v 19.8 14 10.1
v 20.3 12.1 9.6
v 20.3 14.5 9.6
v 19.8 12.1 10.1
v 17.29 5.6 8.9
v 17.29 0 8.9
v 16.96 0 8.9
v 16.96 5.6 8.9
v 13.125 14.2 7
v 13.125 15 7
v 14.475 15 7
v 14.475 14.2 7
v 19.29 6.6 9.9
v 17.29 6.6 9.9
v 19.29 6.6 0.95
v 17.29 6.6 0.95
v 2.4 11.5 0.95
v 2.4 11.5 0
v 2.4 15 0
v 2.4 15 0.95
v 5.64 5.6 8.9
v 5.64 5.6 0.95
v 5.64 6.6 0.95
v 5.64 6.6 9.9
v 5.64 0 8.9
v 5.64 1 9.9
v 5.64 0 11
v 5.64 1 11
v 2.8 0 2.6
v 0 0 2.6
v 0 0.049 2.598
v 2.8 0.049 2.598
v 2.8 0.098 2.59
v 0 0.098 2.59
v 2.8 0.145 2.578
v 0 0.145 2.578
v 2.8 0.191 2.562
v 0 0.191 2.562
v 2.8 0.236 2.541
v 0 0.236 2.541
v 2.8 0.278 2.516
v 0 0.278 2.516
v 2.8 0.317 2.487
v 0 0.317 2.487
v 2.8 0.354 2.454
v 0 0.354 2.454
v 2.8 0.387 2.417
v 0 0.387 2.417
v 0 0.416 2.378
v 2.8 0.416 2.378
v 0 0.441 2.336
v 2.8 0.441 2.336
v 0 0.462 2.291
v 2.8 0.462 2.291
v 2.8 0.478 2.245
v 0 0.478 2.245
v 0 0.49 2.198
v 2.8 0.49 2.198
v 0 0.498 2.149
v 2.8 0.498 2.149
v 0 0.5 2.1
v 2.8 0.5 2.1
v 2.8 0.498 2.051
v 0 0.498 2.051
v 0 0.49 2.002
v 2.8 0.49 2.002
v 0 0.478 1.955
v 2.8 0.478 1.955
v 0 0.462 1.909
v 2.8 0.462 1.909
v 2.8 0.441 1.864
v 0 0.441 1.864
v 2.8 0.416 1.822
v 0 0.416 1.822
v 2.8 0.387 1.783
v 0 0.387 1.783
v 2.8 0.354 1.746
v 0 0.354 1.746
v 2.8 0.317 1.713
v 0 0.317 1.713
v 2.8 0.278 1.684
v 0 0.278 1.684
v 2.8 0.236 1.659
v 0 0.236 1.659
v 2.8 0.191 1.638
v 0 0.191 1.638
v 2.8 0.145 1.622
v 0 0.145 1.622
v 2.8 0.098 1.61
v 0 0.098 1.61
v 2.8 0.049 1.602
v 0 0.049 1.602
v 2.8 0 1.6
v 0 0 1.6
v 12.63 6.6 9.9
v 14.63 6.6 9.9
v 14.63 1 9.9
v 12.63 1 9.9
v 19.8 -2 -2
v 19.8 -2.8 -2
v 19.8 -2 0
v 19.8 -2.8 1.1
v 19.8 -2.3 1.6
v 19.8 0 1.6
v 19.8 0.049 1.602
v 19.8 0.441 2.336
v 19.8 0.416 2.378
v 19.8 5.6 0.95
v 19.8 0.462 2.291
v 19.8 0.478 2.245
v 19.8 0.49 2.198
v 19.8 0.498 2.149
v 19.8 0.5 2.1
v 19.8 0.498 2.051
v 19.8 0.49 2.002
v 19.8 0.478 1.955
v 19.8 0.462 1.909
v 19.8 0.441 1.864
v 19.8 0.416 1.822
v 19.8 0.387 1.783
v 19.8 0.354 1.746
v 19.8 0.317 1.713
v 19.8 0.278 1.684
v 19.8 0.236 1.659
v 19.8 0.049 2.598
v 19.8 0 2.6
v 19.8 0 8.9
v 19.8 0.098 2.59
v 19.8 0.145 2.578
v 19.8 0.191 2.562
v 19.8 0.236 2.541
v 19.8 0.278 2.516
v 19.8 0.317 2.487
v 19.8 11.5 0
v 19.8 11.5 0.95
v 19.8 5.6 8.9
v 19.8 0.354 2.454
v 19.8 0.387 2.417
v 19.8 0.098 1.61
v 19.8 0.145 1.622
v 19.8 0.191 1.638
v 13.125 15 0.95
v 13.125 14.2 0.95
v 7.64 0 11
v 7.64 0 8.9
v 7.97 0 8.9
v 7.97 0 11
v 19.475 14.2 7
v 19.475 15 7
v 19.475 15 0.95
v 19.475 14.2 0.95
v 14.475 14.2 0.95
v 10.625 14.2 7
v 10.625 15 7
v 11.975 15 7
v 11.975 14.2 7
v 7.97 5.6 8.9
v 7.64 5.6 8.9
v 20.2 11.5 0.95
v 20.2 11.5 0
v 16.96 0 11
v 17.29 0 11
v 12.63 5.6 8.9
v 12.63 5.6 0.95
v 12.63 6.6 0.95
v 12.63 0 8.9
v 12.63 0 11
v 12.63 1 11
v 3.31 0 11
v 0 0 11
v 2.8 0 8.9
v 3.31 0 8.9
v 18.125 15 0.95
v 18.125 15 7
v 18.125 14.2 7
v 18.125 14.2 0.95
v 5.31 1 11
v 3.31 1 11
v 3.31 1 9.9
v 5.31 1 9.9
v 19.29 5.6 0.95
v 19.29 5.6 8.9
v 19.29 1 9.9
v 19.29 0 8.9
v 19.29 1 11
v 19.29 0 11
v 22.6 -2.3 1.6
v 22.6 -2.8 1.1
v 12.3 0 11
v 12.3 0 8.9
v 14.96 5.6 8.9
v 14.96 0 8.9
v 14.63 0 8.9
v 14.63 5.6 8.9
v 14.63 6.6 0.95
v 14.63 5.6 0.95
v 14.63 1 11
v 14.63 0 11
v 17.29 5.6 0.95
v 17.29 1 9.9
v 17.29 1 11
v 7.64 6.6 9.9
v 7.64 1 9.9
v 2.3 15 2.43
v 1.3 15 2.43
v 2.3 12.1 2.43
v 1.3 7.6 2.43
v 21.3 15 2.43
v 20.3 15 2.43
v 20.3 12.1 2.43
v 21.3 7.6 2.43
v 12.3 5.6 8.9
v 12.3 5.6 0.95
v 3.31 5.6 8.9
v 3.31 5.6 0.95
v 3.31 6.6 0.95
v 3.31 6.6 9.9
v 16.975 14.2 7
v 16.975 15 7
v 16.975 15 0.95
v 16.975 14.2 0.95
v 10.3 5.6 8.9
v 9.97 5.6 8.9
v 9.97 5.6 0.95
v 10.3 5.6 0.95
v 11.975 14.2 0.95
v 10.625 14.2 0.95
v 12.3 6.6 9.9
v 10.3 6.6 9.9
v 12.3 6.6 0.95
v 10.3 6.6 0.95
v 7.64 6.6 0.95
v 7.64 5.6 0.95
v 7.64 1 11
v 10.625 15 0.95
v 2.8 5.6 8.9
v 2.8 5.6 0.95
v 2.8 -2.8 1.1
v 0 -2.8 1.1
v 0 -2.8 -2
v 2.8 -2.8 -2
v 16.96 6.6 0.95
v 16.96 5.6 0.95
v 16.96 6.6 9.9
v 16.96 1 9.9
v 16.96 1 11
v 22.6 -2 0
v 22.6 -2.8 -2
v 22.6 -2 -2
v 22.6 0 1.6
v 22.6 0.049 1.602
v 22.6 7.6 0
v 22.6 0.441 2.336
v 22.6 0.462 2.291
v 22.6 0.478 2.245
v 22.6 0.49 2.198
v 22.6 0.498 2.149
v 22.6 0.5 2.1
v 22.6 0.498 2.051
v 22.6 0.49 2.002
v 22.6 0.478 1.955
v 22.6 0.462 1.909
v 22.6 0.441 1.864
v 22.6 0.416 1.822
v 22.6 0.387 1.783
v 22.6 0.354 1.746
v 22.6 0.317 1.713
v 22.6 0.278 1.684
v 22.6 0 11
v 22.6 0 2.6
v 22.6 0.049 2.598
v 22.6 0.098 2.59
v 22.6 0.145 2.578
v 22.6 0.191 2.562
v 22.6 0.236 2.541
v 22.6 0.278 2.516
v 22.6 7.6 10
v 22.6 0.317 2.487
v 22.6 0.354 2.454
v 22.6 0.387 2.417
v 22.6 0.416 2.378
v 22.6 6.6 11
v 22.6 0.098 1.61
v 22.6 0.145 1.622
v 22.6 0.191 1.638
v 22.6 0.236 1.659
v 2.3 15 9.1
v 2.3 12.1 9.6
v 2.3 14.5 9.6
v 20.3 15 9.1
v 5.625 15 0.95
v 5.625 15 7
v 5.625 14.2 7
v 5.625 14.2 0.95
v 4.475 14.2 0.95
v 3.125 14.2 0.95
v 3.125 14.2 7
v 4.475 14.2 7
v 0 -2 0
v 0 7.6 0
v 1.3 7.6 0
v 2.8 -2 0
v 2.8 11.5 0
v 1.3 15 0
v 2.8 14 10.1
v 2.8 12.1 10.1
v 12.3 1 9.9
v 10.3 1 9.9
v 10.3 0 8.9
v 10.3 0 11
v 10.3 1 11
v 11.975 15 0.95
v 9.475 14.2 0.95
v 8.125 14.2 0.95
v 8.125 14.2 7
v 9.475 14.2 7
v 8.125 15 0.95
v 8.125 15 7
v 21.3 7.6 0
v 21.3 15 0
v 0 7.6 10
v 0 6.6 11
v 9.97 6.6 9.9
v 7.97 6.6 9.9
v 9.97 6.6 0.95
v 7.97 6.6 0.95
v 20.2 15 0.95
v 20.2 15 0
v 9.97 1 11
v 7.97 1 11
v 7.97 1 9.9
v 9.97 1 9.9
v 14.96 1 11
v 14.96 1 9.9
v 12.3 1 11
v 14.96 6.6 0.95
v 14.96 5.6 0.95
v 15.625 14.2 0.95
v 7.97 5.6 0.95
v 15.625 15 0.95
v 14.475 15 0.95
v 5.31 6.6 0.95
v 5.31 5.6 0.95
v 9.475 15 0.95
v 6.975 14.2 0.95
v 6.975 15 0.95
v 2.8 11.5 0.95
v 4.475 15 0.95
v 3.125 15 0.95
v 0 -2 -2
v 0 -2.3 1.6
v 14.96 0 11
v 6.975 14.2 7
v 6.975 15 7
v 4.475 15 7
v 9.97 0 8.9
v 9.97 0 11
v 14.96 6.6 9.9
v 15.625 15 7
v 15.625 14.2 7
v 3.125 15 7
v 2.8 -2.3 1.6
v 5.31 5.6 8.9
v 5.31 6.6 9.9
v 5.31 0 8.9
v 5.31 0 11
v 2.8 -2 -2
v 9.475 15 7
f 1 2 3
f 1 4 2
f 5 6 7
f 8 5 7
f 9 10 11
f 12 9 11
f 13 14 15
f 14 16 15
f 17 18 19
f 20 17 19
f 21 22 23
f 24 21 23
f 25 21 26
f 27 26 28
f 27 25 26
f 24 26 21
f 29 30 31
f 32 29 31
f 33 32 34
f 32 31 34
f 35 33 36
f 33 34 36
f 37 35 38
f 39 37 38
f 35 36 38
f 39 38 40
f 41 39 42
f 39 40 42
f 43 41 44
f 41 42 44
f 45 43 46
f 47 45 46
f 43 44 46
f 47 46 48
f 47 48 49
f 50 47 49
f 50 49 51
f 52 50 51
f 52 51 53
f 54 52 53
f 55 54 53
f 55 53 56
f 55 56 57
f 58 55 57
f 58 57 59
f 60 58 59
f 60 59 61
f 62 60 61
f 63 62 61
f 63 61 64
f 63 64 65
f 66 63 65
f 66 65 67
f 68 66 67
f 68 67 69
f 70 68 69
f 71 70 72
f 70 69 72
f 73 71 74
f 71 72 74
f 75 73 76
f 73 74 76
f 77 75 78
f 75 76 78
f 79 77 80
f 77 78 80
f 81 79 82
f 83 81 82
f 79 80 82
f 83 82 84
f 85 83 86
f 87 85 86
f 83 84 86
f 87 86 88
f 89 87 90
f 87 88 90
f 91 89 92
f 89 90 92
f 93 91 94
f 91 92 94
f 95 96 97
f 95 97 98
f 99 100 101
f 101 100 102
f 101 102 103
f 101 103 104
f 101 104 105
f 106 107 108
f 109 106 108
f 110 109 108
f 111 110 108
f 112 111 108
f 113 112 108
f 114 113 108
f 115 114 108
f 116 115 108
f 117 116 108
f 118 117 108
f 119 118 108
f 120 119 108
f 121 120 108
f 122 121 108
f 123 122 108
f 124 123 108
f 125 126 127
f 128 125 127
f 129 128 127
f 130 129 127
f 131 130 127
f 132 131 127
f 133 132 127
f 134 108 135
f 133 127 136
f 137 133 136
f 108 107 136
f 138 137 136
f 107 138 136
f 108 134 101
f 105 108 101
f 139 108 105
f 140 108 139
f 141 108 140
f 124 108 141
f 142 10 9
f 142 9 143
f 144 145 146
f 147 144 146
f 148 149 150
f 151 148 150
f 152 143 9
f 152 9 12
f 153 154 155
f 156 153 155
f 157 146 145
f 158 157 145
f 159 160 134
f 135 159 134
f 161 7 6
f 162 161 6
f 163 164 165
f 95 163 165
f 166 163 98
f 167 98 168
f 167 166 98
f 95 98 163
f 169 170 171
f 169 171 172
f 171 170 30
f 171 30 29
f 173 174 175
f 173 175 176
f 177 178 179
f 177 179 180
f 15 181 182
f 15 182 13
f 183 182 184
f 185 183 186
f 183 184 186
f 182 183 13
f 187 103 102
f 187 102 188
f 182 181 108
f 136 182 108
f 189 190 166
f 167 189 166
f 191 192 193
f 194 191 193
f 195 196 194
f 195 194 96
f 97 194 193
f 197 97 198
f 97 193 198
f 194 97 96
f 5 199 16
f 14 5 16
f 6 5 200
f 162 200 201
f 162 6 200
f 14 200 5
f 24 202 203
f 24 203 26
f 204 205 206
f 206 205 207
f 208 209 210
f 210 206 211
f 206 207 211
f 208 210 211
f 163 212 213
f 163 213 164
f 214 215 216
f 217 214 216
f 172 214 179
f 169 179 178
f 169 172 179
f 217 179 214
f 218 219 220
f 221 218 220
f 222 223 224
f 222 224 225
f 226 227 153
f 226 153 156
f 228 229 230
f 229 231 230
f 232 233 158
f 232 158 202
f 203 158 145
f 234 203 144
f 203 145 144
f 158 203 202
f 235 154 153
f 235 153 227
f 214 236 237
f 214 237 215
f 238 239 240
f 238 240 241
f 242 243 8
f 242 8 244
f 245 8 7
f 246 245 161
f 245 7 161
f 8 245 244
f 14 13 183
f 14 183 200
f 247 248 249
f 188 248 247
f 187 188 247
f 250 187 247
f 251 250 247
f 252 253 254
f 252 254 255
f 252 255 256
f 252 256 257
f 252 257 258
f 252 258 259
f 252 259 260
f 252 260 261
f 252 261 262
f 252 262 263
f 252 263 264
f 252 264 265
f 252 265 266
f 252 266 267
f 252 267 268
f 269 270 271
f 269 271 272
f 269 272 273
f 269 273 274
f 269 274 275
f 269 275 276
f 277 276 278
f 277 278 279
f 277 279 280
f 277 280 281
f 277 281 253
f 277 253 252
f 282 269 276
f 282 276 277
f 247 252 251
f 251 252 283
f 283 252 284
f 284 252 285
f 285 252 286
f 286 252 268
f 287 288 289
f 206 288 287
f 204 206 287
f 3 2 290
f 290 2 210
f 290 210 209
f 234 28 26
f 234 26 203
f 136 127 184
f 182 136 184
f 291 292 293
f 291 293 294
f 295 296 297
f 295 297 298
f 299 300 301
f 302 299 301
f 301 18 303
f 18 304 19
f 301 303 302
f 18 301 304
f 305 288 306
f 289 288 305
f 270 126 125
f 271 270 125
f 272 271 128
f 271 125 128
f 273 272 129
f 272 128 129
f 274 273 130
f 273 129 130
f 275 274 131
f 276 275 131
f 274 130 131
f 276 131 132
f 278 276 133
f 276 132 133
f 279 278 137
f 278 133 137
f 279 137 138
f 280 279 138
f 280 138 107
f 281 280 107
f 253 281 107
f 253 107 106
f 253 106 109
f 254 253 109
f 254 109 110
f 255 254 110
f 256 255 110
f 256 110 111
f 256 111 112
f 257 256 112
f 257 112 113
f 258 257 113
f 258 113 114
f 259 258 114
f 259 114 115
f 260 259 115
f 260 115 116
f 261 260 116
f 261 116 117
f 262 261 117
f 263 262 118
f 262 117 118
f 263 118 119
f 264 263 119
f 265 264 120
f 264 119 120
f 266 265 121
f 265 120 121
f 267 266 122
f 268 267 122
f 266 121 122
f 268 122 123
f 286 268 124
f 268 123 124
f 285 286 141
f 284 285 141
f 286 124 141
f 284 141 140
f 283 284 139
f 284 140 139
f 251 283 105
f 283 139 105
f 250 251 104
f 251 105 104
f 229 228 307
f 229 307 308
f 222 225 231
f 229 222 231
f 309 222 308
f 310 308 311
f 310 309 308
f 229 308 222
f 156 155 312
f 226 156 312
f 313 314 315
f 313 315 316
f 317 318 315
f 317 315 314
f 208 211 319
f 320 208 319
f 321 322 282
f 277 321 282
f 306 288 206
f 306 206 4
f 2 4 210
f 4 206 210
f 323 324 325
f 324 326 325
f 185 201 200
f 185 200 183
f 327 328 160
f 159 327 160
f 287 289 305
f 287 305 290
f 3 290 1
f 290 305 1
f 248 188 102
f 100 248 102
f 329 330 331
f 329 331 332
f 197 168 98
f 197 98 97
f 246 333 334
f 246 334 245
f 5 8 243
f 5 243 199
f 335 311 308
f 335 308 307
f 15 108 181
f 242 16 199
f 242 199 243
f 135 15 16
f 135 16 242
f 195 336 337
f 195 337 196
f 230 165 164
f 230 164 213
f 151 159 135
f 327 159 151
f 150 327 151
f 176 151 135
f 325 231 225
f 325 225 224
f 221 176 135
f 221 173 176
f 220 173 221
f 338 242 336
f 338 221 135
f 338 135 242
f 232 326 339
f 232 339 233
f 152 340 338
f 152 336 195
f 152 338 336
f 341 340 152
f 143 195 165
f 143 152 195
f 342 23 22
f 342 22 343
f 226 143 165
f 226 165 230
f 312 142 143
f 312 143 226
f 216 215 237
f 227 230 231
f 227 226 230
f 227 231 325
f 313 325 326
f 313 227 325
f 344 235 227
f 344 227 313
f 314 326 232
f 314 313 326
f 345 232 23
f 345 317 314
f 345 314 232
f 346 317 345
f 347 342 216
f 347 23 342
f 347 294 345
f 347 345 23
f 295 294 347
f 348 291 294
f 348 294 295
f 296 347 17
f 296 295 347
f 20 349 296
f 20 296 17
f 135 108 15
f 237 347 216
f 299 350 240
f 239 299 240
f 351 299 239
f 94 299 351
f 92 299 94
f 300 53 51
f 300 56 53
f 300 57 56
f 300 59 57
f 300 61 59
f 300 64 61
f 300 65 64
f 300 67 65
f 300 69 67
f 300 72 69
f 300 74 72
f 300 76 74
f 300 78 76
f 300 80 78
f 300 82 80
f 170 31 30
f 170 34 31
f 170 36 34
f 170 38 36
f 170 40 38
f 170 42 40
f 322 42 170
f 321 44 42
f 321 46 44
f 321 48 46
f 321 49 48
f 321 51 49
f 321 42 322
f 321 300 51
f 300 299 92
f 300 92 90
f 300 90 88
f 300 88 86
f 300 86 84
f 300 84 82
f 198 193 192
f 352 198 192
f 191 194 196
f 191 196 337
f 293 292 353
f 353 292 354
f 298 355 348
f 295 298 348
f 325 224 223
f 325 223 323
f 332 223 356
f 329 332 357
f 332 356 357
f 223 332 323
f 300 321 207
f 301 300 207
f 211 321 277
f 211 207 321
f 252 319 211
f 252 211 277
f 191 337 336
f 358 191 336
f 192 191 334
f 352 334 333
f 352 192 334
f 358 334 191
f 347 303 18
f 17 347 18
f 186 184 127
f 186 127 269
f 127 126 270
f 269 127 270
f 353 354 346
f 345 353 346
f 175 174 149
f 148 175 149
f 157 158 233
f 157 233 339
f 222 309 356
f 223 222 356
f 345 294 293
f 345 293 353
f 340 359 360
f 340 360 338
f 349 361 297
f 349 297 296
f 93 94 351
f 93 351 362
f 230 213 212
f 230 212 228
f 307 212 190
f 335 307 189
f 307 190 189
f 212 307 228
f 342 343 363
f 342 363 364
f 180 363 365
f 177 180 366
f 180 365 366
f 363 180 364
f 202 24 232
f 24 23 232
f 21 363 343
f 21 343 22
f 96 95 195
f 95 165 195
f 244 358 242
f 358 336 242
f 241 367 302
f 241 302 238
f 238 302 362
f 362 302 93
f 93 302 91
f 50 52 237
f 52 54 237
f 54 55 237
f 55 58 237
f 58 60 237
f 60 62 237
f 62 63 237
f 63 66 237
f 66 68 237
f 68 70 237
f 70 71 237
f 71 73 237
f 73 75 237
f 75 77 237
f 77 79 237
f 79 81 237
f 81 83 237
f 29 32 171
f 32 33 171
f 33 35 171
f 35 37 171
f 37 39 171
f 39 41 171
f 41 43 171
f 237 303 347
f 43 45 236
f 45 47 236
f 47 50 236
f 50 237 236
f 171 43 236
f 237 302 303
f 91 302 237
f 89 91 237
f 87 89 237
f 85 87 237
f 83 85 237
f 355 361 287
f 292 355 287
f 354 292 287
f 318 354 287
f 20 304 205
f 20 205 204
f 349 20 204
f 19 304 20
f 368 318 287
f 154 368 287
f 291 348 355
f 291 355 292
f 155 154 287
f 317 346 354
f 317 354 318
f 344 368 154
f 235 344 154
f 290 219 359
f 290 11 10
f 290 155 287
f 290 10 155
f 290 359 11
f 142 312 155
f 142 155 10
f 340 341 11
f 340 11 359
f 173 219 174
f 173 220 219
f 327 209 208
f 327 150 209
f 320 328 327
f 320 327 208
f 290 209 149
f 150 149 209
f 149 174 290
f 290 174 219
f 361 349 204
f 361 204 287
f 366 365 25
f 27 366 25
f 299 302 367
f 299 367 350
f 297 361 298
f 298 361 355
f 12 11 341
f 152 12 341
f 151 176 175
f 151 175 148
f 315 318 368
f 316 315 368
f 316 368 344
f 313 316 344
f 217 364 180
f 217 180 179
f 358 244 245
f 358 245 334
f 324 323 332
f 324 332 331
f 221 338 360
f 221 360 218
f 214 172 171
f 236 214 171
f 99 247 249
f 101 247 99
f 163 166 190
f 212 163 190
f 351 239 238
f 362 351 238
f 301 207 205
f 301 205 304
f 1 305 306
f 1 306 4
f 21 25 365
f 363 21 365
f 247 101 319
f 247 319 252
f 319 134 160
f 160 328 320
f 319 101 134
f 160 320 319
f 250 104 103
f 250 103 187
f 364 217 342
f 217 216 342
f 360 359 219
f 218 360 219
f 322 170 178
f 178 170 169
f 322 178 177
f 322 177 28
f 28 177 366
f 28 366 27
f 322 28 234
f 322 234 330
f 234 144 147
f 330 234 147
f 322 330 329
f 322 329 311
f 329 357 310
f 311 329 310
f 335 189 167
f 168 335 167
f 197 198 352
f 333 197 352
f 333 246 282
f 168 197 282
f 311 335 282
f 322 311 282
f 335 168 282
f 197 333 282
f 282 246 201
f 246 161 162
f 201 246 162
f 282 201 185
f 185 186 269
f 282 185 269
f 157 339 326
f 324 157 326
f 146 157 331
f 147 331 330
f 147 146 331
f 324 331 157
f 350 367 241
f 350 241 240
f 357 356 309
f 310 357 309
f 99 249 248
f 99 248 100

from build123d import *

# Parameters (mm, degrees)
BOSS_EXTRUDE1_DEPTH = 7.6
SKETCH2_W           = 17
SKETCH2_H           = 8.9
BOSS_EXTRUDE2_DEPTH = 2
SKETCH3_W           = 20
SKETCH3_H           = 2.43
BOSS_EXTRUDE3_DEPTH = 7.4
SKETCH4_W           = 18
SKETCH4_H           = 2.9
BOSS_EXTRUDE4_DEPTH = 7.67
CUT_EXTRUDE1_DEPTH  = 0.95
SKETCH6_W           = 1.35
SKETCH6_H           = 6.05
CUT_EXTRUDE2_DEPTH  = 0.8
CHAMFER1_SIZE       = 0.5
CHAMFER2_SIZE       = 1
CHAMFER3_SIZE       = 1
SKETCH7_W           = 2.8
SKETCH7_H           = 1.6
BOSS_EXTRUDE5_DEPTH = 2.8
SKETCH8_W           = 2.8
SKETCH8_H           = 0.8
BOSS_EXTRUDE6_DEPTH = 2
CUT_EXTRUDE3_DEPTH  = 30.270462928
CHAMFER4_SIZE       = 0.5
SKETCH10_W          = 2
SKETCH10_H          = 7.95
SKETCH10_W_2        = 1
CUT_EXTRUDE4_DEPTH  = 1
CUT_EXTRUDE5_DEPTH  = 1
SKETCH12_W          = 2
SKETCH12_H          = 1.1
CUT_EXTRUDE6_DEPTH  = 1


with BuildPart() as part:
    # Sketch1 → Boss-Extrude1 (new body)
    with BuildSketch(Plane(origin=(0, 0, 0), x_dir=(1, 0, 0), z_dir=(0, 1, 0))):
        Polygon((0, 0), (0, -11), (22.6, -11), (22.6, 0), (19.8, 0), (19.8, -8.9), (2.8, -8.9), (2.8, 0), align=None)
    extrude(amount=BOSS_EXTRUDE1_DEPTH)

    # Sketch2 → Boss-Extrude2 (add)
    with BuildSketch(Plane(origin=(0, 7.6, 0), x_dir=(1, 0, 0), z_dir=(0, 1, 0))):
        with Locations((11.3, -4.45)):
            Rectangle(SKETCH2_W, SKETCH2_H)
    extrude(amount=-BOSS_EXTRUDE2_DEPTH)

    # Sketch3 → Boss-Extrude3 (add)
    with BuildSketch(Plane(origin=(0, 7.6, 0), x_dir=(1, 0, 0), z_dir=(0, 1, 0))):
        with Locations((11.3, -1.215)):
            Rectangle(SKETCH3_W, SKETCH3_H)
    extrude(amount=BOSS_EXTRUDE3_DEPTH)

    # Sketch4 → Boss-Extrude4 (add)
    with BuildSketch(Plane.XY.offset(2.43)):
        with Locations((11.3, 13.55)):
            Rectangle(SKETCH4_W, SKETCH4_H)
    extrude(amount=BOSS_EXTRUDE4_DEPTH)

    # Sketch5 → Cut-Extrude1 (cut)
    with BuildSketch(Plane(origin=(0, 0, 0), x_dir=(-1, 0, 0), z_dir=(0, 0, -1))):
        Polygon((-19.8, 11.5), (-19.8, 5.6), (-2.8, 5.6), (-2.8, 11.5), (-2.4, 11.5), (-2.4, 15), (-20.2, 15), (-20.2, 11.5), align=None)
    extrude(amount=-CUT_EXTRUDE1_DEPTH, mode=Mode.SUBTRACT)

    # Sketch6 → Cut-Extrude2 (cut)
    with BuildSketch(Plane(origin=(0, 15, 0), x_dir=(1, 0, 0), z_dir=(0, 1, 0))):
        with Locations((3.8, -3.975)):
            Rectangle(SKETCH6_W, SKETCH6_H)
        with Locations((6.3, -3.975)):
            Rectangle(SKETCH6_W, SKETCH6_H)
        with Locations((8.8, -3.975)):
            Rectangle(SKETCH6_W, SKETCH6_H)
        with Locations((11.3, -3.975)):
            Rectangle(SKETCH6_W, SKETCH6_H)
        with Locations((13.8, -3.975)):
            Rectangle(SKETCH6_W, SKETCH6_H)
        with Locations((16.3, -3.975)):
            Rectangle(SKETCH6_W, SKETCH6_H)
        with Locations((18.8, -3.975)):
            Rectangle(SKETCH6_W, SKETCH6_H)
    extrude(amount=-CUT_EXTRUDE2_DEPTH, mode=Mode.SUBTRACT)

    # Chamfer1
    chamfer1_edges = [part.edges().sort_by_distance(p)[0] for p in [
        (20.3, 13.55, 10.1),
        (2.3, 13.55, 10.1),
    ]]
    chamfer(chamfer1_edges, length=CHAMFER1_SIZE)

    # Chamfer2
    chamfer2_edges = [part.edges().sort_by_distance(p)[0] for p in [
        (11.3, 15, 10.1),
    ]]
    chamfer(chamfer2_edges, length=CHAMFER2_SIZE)

    # Chamfer3
    chamfer3_edges = [part.edges().sort_by_distance(p)[0] for p in [
        (11.3, 7.6, 11),
    ]]
    chamfer(chamfer3_edges, length=CHAMFER3_SIZE)

    # Sketch7 → Boss-Extrude5 (add)
    with BuildSketch(Plane.XZ):
        with Locations((1.4, 0.8)):
            Rectangle(SKETCH7_W, SKETCH7_H)
        with Locations((21.2, 0.8)):
            Rectangle(SKETCH7_W, SKETCH7_H)
    extrude(amount=BOSS_EXTRUDE5_DEPTH)

    # Sketch8 → Boss-Extrude6 (add)
    with BuildSketch(Plane(origin=(0, 0, 0), x_dir=(-1, 0, 0), z_dir=(0, 0, -1))):
        with Locations((-21.2, -2.4)):
            Rectangle(SKETCH8_W, SKETCH8_H)
        with Locations((-1.4, -2.4)):
            Rectangle(SKETCH8_W, SKETCH8_H)
    extrude(amount=BOSS_EXTRUDE6_DEPTH)

    # Sketch9 → Cut-Extrude3 (cut, through all)
    with BuildSketch(Plane.ZY):
        with BuildLine():
            ThreePointArc((1.6, 0), (2.1, -0.5), (2.6, 0))
            Line((2.6, 0), (1.6, 0))
        make_face()
        with BuildLine():
            Line((1.6, 0), (2.6, 0))
            ThreePointArc((2.6, 0), (2.1, 0.5), (1.6, 0))
        make_face()
    extrude(amount=-CUT_EXTRUDE3_DEPTH, mode=Mode.SUBTRACT)

    # Chamfer4
    chamfer4_edges = [part.edges().sort_by_distance(p)[0] for p in [
        (1.4, -2.8, 1.6),
        (21.2, -2.8, 1.6),
    ]]
    chamfer(chamfer4_edges, length=CHAMFER4_SIZE)

    # Sketch10 → Cut-Extrude4 (cut)
    with BuildSketch(Plane.XZ.offset(-5.6)):
        with Locations((4.31, 4.925)):
            Rectangle(SKETCH10_W, SKETCH10_H)
        with Locations((6.64, 4.925)):
            Rectangle(SKETCH10_W, SKETCH10_H)
        with Locations((8.97, 4.925)):
            Rectangle(SKETCH10_W, SKETCH10_H)
        with Locations((11.8, 4.925)):
            Rectangle(SKETCH10_W_2, SKETCH10_H)
        with Locations((10.8, 4.925)):
            Rectangle(SKETCH10_W_2, SKETCH10_H)
        with Locations((13.63, 4.925)):
            Rectangle(SKETCH10_W, SKETCH10_H)
        with Locations((15.96, 4.925)):
            Rectangle(SKETCH10_W, SKETCH10_H)
        with Locations((18.29, 4.925)):
            Rectangle(SKETCH10_W, SKETCH10_H)
    extrude(amount=-CUT_EXTRUDE4_DEPTH, mode=Mode.SUBTRACT)

    # Sketch11 → Cut-Extrude5 (cut)
    with BuildSketch(Plane(origin=(0, 0, 8.9), x_dir=(-1, 0, 0), z_dir=(0, 0, -1))):
        Polygon((-19.29, 6.6), (-19.29, 5.6), (-19.29, 0), (-17.29, 0), (-17.29, 5.6), (-17.29, 6.6), align=None)
        Polygon((-16.96, 5.6), (-16.96, 0), (-14.96, 0), (-14.96, 5.6), (-14.96, 6.6), (-16.96, 6.6), align=None)
        Polygon((-14.63, 5.6), (-14.63, 0), (-12.63, 0), (-12.63, 5.6), (-12.63, 6.6), (-14.63, 6.6), align=None)
        Polygon((-12.3, 5.6), (-12.3, 0), (-10.3, 0), (-10.3, 5.6), (-10.3, 6.6), (-12.3, 6.6), align=None)
        Polygon((-9.97, 5.6), (-9.97, 0), (-7.97, 0), (-7.97, 5.6), (-7.97, 6.6), (-9.97, 6.6), align=None)
        Polygon((-7.64, 5.6), (-7.64, 0), (-5.64, 0), (-5.64, 5.6), (-5.64, 6.6), (-7.64, 6.6), align=None)
        Polygon((-5.31, 5.6), (-5.31, 0), (-3.31, 0), (-3.31, 5.6), (-3.31, 6.6), (-5.31, 6.6), align=None)
    extrude(amount=-CUT_EXTRUDE5_DEPTH, mode=Mode.SUBTRACT)

    # Sketch12 → Cut-Extrude6 (cut)
    with BuildSketch(Plane.XZ):
        with Locations((4.31, 10.45)):
            Rectangle(SKETCH12_W, SKETCH12_H)
        with Locations((6.64, 10.45)):
            Rectangle(SKETCH12_W, SKETCH12_H)
        with Locations((8.97, 10.45)):
            Rectangle(SKETCH12_W, SKETCH12_H)
        with Locations((11.3, 10.45)):
            Rectangle(SKETCH12_W, SKETCH12_H)
        with Locations((13.63, 10.45)):
            Rectangle(SKETCH12_W, SKETCH12_H)
        with Locations((15.96, 10.45)):
            Rectangle(SKETCH12_W, SKETCH12_H)
        with Locations((18.29, 10.45)):
            Rectangle(SKETCH12_W, SKETCH12_H)
    extrude(amount=-CUT_EXTRUDE6_DEPTH, mode=Mode.SUBTRACT)


solid = part.part
